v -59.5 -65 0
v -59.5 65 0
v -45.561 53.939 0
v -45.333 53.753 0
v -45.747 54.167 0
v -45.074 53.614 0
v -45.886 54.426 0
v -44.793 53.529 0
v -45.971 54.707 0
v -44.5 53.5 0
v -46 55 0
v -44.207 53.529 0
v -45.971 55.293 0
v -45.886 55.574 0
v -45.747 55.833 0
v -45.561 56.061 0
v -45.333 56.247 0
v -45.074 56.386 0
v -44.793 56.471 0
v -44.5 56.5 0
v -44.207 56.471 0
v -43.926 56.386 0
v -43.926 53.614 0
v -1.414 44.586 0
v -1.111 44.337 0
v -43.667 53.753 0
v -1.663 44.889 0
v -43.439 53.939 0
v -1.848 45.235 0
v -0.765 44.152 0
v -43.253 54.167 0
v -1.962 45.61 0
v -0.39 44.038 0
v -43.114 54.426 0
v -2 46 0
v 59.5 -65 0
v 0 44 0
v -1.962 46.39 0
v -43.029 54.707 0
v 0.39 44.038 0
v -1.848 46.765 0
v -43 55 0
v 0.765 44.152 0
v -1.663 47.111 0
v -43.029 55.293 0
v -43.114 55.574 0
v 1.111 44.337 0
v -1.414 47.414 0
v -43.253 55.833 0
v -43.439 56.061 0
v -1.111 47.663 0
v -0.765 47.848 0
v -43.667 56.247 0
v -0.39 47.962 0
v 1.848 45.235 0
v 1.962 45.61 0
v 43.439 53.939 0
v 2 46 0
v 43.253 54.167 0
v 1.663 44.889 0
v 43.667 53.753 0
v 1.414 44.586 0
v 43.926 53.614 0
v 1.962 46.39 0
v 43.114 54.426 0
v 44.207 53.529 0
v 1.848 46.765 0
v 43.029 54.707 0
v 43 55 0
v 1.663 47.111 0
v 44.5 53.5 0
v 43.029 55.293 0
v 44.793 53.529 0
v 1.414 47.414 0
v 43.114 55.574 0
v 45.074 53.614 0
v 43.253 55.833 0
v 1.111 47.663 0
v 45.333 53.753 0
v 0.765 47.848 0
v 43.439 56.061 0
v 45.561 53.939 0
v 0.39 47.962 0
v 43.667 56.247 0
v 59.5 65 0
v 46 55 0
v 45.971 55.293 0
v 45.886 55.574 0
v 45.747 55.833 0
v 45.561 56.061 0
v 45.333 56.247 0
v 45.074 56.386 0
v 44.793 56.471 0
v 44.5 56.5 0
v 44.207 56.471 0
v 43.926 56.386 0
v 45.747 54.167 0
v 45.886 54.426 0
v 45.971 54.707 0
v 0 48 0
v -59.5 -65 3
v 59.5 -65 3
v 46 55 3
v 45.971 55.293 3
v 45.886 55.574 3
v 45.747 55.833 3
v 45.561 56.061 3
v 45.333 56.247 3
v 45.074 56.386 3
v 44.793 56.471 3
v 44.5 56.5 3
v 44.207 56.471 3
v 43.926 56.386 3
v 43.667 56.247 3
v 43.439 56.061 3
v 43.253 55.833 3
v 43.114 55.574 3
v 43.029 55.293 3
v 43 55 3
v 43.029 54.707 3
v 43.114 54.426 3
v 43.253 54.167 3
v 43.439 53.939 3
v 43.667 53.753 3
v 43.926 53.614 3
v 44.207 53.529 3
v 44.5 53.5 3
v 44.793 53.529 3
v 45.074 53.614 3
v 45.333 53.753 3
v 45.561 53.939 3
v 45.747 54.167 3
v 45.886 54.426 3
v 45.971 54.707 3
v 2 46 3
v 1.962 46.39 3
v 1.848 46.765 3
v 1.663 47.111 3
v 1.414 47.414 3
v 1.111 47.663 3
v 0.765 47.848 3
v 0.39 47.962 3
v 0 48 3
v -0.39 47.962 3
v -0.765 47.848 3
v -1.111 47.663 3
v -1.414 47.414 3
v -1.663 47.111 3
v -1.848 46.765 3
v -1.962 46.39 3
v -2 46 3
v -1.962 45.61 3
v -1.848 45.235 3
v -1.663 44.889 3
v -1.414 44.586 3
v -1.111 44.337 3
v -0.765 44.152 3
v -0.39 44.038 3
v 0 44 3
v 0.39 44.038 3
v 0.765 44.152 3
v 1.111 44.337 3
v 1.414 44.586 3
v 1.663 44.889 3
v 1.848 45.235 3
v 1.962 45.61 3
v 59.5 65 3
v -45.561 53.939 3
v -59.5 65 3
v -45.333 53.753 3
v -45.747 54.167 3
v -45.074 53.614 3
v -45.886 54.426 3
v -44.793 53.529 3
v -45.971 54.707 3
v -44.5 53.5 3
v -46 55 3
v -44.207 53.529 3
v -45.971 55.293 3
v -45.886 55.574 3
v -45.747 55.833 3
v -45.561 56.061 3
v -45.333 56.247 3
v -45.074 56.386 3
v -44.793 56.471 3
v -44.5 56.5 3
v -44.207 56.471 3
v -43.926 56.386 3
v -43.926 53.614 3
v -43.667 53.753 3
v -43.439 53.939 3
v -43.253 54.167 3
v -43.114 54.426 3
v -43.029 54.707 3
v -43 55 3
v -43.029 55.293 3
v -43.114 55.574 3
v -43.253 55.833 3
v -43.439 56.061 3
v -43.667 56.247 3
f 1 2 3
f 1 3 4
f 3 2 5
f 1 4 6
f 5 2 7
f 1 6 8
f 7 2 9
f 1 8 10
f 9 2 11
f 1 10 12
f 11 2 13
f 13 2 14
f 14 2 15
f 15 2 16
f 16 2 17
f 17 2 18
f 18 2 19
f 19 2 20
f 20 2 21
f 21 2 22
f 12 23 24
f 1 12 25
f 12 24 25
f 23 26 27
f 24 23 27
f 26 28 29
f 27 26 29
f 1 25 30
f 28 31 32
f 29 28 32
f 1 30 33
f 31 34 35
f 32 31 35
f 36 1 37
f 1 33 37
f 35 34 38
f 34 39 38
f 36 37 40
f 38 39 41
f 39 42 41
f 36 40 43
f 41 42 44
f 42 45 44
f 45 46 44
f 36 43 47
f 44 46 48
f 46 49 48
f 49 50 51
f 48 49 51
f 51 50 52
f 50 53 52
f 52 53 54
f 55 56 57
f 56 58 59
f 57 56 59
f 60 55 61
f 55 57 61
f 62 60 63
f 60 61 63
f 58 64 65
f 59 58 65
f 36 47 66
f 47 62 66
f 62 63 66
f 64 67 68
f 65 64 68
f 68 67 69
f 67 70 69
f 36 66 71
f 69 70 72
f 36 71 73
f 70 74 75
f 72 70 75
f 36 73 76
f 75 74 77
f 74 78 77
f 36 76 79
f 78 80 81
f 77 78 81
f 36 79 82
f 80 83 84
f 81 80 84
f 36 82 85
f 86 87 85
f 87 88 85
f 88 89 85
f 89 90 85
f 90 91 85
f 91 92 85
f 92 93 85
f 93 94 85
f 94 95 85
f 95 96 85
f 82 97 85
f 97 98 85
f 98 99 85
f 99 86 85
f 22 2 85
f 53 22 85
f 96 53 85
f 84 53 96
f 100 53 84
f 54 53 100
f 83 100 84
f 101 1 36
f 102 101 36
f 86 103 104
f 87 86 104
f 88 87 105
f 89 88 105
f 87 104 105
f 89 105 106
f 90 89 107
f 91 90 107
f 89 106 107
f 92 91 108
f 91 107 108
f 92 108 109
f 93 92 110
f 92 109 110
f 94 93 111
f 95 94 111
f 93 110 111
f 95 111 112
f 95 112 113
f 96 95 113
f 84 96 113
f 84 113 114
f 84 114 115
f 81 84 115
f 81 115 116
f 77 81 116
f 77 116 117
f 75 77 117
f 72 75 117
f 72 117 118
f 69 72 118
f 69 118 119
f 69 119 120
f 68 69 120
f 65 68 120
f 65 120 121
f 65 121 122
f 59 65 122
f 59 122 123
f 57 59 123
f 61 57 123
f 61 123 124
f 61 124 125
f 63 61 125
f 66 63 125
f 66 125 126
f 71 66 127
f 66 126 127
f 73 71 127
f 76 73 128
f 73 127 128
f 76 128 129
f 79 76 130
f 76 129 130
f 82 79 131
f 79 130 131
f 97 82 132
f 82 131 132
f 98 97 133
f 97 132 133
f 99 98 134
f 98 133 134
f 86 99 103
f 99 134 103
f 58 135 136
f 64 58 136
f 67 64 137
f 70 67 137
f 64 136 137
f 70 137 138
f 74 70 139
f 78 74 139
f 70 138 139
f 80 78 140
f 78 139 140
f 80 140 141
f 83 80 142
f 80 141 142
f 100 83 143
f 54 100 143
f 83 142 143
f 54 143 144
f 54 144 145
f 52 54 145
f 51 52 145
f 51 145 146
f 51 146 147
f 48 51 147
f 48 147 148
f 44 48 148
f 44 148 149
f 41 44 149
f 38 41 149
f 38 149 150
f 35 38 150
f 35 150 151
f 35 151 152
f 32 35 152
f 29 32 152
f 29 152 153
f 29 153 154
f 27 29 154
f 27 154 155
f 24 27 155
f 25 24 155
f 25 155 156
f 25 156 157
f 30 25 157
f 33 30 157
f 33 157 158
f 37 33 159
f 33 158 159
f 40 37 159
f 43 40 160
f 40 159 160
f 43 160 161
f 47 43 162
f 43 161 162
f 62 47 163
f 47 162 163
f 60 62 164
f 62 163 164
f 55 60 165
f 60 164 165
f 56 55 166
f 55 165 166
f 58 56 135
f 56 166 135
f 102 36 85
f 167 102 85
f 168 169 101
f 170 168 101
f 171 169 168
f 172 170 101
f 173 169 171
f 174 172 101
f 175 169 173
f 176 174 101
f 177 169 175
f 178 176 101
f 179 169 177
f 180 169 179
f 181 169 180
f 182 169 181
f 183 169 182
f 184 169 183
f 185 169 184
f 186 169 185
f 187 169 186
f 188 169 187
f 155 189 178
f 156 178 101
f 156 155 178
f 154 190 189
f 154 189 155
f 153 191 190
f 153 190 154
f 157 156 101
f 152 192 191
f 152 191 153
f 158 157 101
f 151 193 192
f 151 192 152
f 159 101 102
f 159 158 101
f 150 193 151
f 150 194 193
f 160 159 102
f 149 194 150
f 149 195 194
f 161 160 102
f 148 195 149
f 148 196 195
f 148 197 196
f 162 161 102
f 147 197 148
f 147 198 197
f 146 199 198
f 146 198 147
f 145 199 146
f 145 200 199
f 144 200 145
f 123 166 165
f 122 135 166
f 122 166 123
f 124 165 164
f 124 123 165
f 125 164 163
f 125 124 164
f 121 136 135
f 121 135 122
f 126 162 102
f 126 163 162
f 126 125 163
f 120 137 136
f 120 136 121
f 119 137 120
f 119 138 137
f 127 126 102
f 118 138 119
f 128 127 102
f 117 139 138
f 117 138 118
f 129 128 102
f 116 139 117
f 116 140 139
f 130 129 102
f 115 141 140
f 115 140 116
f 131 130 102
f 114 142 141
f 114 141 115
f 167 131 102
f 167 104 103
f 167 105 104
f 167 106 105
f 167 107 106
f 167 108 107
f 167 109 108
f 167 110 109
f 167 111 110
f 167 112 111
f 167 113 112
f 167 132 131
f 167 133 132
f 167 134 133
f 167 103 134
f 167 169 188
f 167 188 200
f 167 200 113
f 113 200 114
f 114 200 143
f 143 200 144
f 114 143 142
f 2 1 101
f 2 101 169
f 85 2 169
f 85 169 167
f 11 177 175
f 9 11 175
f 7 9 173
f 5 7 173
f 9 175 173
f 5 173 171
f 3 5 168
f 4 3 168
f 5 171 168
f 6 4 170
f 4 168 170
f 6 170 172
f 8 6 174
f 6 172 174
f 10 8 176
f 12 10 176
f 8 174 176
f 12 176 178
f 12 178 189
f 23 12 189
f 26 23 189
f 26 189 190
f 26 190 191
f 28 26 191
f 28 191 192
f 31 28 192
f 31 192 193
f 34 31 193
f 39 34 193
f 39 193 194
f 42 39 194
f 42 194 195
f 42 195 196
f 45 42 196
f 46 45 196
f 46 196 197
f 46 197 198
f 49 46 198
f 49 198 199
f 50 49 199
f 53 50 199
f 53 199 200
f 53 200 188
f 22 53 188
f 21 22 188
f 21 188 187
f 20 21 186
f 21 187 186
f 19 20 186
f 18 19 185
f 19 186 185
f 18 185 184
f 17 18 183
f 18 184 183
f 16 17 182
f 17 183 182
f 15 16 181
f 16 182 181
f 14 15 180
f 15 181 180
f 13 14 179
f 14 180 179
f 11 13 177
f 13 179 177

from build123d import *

# Parameters (mm, degrees)
SKETCH_1_W          = 119
SKETCH_1_H          = 130
EXTRUDE_1_DEPTH     = 3
SKETCH_2_R          = 1.5
CUT_EXTRUDE_1_DEPTH = 89.17170748
SKETCH_4_R          = 2
CUT_EXTRUDE_2_DEPTH = 89.17170748


with BuildPart() as part:
    # 草图1 → 凸台-拉伸1 (new body)
    with BuildSketch(Plane.XY):
        Rectangle(SKETCH_1_W, SKETCH_1_H)
    extrude(amount=EXTRUDE_1_DEPTH)

    # 草图2 → 切除-拉伸1 (cut, through all)
    with BuildSketch(Plane.XY.offset(3)):
        with Locations((44.5, 55)):
            Circle(SKETCH_2_R)
        with Locations(Location((-44.5, 55, 0), (0, 0, 180))):
            Circle(SKETCH_2_R)
    extrude(amount=-CUT_EXTRUDE_1_DEPTH, mode=Mode.SUBTRACT)

    # 草图4 → 切除-拉伸2 (cut, through all)
    with BuildSketch(Plane.XY.offset(3)):
        with Locations((0, 46)):
            Circle(SKETCH_4_R)
    extrude(amount=-CUT_EXTRUDE_2_DEPTH, mode=Mode.SUBTRACT)


solid = part.part
